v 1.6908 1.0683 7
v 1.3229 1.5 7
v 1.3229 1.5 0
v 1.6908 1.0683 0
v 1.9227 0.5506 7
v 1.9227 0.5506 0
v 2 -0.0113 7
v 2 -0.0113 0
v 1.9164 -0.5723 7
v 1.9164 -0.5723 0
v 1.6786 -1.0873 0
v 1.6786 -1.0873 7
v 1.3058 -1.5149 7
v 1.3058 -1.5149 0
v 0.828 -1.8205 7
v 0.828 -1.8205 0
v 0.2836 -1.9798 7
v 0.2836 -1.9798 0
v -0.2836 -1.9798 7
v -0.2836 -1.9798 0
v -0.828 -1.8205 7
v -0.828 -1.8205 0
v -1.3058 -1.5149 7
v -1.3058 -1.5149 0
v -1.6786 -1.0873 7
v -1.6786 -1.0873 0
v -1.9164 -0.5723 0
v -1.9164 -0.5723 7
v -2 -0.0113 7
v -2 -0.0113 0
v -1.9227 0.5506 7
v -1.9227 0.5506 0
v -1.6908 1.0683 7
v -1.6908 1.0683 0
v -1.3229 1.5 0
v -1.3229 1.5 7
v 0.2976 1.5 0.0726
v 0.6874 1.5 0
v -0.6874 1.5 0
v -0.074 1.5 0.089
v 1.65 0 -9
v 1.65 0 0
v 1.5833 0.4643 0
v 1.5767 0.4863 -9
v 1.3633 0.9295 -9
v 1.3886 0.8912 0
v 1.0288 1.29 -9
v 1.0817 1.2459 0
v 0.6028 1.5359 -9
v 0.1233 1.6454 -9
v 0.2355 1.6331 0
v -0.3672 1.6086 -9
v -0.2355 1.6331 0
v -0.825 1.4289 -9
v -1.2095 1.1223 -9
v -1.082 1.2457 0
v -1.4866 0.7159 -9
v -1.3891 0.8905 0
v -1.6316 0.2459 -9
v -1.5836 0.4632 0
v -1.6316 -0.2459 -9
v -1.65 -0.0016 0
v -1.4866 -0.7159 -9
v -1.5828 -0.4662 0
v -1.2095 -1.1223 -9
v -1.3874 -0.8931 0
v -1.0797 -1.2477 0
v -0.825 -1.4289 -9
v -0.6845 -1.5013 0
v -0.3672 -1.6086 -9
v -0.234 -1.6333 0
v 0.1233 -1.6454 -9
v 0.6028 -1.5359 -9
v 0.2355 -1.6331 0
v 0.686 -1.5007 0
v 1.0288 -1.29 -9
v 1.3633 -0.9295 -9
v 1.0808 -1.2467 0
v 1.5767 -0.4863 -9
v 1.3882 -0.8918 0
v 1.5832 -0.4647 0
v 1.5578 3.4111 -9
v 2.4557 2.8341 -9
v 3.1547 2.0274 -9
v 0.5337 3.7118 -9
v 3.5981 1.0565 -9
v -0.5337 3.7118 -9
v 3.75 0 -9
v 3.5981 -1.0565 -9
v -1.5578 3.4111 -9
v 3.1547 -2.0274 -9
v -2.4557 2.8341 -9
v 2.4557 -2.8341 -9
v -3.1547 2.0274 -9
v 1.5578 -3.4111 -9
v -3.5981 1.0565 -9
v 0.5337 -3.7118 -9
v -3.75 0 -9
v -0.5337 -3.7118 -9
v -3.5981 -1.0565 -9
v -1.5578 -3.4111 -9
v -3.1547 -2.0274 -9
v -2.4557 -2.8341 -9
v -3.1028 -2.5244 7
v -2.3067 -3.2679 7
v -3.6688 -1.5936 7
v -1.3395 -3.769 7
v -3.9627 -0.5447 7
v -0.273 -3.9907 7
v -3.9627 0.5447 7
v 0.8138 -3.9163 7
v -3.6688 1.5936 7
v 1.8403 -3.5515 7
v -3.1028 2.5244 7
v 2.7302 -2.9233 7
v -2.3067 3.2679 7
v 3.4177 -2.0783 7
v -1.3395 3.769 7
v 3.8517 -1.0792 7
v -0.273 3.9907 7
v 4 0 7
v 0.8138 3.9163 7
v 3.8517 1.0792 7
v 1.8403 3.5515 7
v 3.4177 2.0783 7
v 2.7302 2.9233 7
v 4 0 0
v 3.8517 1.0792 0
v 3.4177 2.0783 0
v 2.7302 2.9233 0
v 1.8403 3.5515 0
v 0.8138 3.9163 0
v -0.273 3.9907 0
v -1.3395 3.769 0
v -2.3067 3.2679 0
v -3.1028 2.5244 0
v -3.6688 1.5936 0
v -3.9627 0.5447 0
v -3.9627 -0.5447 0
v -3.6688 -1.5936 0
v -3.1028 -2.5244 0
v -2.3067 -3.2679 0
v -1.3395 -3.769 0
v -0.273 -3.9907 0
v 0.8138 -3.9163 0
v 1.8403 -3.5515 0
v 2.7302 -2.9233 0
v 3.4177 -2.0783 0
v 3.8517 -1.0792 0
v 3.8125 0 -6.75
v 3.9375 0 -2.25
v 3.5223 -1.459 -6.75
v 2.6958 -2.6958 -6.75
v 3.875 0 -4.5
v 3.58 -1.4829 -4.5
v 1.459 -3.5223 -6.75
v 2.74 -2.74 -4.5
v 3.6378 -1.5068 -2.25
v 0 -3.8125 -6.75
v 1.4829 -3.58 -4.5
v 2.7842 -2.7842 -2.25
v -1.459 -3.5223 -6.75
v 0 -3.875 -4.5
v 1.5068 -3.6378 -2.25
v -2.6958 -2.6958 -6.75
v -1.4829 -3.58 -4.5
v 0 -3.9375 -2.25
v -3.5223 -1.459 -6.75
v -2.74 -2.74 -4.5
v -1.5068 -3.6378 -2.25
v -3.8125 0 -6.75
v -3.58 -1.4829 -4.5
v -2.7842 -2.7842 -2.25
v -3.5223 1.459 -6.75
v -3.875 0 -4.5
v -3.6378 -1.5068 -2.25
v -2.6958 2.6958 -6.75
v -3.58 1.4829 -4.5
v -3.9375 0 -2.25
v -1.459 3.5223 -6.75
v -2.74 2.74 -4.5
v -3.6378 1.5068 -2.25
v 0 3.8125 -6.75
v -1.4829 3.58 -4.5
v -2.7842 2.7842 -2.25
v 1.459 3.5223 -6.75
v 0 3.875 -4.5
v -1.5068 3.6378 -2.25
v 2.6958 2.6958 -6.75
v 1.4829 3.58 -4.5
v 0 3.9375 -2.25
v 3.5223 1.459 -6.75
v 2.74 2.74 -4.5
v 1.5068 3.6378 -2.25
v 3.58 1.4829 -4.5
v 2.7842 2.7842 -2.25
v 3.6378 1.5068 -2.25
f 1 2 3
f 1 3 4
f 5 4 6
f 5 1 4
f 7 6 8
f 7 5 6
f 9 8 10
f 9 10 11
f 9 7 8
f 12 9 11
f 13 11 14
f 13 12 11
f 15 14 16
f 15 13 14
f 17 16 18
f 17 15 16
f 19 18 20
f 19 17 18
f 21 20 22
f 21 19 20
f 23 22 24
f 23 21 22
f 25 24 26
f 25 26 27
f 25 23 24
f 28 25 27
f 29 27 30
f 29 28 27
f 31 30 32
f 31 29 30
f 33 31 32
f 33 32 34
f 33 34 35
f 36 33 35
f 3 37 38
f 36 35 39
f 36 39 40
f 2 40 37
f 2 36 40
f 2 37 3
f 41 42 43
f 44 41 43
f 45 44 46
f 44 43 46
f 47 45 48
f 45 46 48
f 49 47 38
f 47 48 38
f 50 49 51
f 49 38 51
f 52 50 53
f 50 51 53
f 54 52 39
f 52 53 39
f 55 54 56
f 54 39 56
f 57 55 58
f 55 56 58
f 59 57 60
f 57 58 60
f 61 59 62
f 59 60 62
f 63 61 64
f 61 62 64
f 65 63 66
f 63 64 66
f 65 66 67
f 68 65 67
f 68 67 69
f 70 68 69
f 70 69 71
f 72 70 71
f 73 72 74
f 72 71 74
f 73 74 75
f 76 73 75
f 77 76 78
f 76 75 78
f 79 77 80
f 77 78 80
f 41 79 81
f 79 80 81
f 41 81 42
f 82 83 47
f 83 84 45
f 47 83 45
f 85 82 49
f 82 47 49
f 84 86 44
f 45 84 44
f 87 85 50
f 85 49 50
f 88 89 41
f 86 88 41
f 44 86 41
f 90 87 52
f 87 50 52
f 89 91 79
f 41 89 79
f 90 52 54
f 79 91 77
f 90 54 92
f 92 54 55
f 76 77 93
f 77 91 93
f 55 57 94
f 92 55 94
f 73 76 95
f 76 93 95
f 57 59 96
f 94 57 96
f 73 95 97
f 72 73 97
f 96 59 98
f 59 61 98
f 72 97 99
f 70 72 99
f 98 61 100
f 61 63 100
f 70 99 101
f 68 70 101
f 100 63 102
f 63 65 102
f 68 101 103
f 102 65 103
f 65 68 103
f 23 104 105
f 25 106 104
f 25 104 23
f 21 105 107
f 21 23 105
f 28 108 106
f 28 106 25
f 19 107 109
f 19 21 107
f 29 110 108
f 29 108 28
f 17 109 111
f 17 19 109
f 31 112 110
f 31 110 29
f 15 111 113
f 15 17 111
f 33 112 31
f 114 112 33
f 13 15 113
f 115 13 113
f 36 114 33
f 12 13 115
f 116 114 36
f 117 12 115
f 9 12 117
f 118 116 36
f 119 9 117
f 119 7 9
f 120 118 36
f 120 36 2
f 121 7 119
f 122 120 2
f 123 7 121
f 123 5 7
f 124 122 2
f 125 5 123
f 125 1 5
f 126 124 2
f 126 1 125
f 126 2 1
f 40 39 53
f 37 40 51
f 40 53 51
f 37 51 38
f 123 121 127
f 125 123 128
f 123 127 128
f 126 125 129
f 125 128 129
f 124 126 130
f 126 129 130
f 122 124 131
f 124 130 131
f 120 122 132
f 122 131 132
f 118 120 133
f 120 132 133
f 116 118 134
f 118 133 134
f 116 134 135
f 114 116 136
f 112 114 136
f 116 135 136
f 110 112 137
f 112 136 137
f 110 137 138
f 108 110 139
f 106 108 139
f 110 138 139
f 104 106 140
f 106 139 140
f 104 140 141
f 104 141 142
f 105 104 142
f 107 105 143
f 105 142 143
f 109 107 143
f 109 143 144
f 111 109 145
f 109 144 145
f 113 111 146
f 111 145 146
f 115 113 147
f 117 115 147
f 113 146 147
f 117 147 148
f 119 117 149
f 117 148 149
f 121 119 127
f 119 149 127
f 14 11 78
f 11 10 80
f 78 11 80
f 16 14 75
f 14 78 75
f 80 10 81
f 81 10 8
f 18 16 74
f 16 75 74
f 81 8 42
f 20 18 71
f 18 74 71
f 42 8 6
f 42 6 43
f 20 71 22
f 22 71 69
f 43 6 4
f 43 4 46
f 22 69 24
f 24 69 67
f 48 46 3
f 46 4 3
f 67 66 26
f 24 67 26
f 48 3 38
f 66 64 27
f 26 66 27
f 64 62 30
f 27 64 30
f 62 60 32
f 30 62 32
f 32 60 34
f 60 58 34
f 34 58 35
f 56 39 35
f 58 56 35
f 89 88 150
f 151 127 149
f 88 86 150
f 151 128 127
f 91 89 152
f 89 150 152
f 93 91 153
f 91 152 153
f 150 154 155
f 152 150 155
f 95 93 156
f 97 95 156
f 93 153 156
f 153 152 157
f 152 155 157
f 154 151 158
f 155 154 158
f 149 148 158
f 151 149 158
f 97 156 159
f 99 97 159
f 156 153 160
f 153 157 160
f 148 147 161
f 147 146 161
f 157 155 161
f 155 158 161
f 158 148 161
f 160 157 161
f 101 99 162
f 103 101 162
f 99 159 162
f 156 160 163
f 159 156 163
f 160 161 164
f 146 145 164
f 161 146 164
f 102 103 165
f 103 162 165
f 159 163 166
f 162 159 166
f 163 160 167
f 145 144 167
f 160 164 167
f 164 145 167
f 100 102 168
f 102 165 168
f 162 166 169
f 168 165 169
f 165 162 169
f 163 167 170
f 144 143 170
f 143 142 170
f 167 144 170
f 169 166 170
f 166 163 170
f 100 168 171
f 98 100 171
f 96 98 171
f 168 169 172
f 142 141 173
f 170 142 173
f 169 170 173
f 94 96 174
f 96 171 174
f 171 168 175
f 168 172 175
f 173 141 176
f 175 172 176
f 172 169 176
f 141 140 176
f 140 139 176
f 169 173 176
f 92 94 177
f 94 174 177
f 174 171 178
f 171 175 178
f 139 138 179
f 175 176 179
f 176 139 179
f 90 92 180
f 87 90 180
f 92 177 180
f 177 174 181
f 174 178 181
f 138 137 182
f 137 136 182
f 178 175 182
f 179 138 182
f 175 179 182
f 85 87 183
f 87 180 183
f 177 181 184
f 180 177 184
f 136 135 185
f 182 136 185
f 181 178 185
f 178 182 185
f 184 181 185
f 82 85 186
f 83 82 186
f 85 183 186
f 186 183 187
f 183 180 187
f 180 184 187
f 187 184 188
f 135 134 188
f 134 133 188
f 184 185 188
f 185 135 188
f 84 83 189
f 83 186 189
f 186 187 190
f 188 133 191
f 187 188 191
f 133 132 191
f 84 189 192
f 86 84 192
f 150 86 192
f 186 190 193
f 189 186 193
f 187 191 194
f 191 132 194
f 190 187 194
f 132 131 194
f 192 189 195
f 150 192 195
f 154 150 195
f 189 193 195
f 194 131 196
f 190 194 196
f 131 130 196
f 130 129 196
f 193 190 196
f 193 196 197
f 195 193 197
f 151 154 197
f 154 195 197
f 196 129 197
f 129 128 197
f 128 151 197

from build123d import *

# Parameters (mm, degrees)
SKETCH_6_R          = 4
EXTRUDE_2_DEPTH     = 7
M4X0_72_D           = 3.3
M4X0_72_DEPTH       = 9
M4X0_72_TIP         = 0.991420021
CUT_EXTRUDE_1_DEPTH = 7


with BuildPart() as part:
    # Эскиз1 → Повернуть1 (revolve)
    with BuildSketch(Plane(origin=(0, 0, 0), x_dir=(1, 0, 0), z_dir=(0, 1, 0))):
        Polygon((0, 9), (3.75, 9), (4, 0), (0, 0), align=None)
    revolve(axis=Axis((0, 0, 0), (0, 0, -1)))

    # Эскиз6 → Бобышка-Вытянуть2 (add)
    with BuildSketch(Plane.XY):
        Circle(SKETCH_6_R)
    extrude(amount=EXTRUDE_2_DEPTH)

    # Отверстие обработанное метчиком M4x0.72
    with Locations(Plane(origin=(0, 0, -9), x_dir=(-1, 0, 0), z_dir=(0, 0, -1))):
        with Locations((0, 0)):
            Hole(M4X0_72_D / 2, depth=M4X0_72_DEPTH)
            with Locations((0, 0, -(M4X0_72_DEPTH + M4X0_72_TIP / 2))):  # 118° drill point
                Cone(0, M4X0_72_D / 2, M4X0_72_TIP, mode=Mode.SUBTRACT)

    # Эскиз9 → Вырез-Вытянуть1 (cut)
    with BuildSketch(Plane.XY.offset(7)):
        with BuildLine():
            Line((-1.322875656, 1.5), (1.322875656, 1.5))
            ThreePointArc((1.322875656, 1.5), (0, -2), (-1.322875656, 1.5))
        make_face()
    extrude(amount=-CUT_EXTRUDE_1_DEPTH, mode=Mode.SUBTRACT)


solid = part.part
